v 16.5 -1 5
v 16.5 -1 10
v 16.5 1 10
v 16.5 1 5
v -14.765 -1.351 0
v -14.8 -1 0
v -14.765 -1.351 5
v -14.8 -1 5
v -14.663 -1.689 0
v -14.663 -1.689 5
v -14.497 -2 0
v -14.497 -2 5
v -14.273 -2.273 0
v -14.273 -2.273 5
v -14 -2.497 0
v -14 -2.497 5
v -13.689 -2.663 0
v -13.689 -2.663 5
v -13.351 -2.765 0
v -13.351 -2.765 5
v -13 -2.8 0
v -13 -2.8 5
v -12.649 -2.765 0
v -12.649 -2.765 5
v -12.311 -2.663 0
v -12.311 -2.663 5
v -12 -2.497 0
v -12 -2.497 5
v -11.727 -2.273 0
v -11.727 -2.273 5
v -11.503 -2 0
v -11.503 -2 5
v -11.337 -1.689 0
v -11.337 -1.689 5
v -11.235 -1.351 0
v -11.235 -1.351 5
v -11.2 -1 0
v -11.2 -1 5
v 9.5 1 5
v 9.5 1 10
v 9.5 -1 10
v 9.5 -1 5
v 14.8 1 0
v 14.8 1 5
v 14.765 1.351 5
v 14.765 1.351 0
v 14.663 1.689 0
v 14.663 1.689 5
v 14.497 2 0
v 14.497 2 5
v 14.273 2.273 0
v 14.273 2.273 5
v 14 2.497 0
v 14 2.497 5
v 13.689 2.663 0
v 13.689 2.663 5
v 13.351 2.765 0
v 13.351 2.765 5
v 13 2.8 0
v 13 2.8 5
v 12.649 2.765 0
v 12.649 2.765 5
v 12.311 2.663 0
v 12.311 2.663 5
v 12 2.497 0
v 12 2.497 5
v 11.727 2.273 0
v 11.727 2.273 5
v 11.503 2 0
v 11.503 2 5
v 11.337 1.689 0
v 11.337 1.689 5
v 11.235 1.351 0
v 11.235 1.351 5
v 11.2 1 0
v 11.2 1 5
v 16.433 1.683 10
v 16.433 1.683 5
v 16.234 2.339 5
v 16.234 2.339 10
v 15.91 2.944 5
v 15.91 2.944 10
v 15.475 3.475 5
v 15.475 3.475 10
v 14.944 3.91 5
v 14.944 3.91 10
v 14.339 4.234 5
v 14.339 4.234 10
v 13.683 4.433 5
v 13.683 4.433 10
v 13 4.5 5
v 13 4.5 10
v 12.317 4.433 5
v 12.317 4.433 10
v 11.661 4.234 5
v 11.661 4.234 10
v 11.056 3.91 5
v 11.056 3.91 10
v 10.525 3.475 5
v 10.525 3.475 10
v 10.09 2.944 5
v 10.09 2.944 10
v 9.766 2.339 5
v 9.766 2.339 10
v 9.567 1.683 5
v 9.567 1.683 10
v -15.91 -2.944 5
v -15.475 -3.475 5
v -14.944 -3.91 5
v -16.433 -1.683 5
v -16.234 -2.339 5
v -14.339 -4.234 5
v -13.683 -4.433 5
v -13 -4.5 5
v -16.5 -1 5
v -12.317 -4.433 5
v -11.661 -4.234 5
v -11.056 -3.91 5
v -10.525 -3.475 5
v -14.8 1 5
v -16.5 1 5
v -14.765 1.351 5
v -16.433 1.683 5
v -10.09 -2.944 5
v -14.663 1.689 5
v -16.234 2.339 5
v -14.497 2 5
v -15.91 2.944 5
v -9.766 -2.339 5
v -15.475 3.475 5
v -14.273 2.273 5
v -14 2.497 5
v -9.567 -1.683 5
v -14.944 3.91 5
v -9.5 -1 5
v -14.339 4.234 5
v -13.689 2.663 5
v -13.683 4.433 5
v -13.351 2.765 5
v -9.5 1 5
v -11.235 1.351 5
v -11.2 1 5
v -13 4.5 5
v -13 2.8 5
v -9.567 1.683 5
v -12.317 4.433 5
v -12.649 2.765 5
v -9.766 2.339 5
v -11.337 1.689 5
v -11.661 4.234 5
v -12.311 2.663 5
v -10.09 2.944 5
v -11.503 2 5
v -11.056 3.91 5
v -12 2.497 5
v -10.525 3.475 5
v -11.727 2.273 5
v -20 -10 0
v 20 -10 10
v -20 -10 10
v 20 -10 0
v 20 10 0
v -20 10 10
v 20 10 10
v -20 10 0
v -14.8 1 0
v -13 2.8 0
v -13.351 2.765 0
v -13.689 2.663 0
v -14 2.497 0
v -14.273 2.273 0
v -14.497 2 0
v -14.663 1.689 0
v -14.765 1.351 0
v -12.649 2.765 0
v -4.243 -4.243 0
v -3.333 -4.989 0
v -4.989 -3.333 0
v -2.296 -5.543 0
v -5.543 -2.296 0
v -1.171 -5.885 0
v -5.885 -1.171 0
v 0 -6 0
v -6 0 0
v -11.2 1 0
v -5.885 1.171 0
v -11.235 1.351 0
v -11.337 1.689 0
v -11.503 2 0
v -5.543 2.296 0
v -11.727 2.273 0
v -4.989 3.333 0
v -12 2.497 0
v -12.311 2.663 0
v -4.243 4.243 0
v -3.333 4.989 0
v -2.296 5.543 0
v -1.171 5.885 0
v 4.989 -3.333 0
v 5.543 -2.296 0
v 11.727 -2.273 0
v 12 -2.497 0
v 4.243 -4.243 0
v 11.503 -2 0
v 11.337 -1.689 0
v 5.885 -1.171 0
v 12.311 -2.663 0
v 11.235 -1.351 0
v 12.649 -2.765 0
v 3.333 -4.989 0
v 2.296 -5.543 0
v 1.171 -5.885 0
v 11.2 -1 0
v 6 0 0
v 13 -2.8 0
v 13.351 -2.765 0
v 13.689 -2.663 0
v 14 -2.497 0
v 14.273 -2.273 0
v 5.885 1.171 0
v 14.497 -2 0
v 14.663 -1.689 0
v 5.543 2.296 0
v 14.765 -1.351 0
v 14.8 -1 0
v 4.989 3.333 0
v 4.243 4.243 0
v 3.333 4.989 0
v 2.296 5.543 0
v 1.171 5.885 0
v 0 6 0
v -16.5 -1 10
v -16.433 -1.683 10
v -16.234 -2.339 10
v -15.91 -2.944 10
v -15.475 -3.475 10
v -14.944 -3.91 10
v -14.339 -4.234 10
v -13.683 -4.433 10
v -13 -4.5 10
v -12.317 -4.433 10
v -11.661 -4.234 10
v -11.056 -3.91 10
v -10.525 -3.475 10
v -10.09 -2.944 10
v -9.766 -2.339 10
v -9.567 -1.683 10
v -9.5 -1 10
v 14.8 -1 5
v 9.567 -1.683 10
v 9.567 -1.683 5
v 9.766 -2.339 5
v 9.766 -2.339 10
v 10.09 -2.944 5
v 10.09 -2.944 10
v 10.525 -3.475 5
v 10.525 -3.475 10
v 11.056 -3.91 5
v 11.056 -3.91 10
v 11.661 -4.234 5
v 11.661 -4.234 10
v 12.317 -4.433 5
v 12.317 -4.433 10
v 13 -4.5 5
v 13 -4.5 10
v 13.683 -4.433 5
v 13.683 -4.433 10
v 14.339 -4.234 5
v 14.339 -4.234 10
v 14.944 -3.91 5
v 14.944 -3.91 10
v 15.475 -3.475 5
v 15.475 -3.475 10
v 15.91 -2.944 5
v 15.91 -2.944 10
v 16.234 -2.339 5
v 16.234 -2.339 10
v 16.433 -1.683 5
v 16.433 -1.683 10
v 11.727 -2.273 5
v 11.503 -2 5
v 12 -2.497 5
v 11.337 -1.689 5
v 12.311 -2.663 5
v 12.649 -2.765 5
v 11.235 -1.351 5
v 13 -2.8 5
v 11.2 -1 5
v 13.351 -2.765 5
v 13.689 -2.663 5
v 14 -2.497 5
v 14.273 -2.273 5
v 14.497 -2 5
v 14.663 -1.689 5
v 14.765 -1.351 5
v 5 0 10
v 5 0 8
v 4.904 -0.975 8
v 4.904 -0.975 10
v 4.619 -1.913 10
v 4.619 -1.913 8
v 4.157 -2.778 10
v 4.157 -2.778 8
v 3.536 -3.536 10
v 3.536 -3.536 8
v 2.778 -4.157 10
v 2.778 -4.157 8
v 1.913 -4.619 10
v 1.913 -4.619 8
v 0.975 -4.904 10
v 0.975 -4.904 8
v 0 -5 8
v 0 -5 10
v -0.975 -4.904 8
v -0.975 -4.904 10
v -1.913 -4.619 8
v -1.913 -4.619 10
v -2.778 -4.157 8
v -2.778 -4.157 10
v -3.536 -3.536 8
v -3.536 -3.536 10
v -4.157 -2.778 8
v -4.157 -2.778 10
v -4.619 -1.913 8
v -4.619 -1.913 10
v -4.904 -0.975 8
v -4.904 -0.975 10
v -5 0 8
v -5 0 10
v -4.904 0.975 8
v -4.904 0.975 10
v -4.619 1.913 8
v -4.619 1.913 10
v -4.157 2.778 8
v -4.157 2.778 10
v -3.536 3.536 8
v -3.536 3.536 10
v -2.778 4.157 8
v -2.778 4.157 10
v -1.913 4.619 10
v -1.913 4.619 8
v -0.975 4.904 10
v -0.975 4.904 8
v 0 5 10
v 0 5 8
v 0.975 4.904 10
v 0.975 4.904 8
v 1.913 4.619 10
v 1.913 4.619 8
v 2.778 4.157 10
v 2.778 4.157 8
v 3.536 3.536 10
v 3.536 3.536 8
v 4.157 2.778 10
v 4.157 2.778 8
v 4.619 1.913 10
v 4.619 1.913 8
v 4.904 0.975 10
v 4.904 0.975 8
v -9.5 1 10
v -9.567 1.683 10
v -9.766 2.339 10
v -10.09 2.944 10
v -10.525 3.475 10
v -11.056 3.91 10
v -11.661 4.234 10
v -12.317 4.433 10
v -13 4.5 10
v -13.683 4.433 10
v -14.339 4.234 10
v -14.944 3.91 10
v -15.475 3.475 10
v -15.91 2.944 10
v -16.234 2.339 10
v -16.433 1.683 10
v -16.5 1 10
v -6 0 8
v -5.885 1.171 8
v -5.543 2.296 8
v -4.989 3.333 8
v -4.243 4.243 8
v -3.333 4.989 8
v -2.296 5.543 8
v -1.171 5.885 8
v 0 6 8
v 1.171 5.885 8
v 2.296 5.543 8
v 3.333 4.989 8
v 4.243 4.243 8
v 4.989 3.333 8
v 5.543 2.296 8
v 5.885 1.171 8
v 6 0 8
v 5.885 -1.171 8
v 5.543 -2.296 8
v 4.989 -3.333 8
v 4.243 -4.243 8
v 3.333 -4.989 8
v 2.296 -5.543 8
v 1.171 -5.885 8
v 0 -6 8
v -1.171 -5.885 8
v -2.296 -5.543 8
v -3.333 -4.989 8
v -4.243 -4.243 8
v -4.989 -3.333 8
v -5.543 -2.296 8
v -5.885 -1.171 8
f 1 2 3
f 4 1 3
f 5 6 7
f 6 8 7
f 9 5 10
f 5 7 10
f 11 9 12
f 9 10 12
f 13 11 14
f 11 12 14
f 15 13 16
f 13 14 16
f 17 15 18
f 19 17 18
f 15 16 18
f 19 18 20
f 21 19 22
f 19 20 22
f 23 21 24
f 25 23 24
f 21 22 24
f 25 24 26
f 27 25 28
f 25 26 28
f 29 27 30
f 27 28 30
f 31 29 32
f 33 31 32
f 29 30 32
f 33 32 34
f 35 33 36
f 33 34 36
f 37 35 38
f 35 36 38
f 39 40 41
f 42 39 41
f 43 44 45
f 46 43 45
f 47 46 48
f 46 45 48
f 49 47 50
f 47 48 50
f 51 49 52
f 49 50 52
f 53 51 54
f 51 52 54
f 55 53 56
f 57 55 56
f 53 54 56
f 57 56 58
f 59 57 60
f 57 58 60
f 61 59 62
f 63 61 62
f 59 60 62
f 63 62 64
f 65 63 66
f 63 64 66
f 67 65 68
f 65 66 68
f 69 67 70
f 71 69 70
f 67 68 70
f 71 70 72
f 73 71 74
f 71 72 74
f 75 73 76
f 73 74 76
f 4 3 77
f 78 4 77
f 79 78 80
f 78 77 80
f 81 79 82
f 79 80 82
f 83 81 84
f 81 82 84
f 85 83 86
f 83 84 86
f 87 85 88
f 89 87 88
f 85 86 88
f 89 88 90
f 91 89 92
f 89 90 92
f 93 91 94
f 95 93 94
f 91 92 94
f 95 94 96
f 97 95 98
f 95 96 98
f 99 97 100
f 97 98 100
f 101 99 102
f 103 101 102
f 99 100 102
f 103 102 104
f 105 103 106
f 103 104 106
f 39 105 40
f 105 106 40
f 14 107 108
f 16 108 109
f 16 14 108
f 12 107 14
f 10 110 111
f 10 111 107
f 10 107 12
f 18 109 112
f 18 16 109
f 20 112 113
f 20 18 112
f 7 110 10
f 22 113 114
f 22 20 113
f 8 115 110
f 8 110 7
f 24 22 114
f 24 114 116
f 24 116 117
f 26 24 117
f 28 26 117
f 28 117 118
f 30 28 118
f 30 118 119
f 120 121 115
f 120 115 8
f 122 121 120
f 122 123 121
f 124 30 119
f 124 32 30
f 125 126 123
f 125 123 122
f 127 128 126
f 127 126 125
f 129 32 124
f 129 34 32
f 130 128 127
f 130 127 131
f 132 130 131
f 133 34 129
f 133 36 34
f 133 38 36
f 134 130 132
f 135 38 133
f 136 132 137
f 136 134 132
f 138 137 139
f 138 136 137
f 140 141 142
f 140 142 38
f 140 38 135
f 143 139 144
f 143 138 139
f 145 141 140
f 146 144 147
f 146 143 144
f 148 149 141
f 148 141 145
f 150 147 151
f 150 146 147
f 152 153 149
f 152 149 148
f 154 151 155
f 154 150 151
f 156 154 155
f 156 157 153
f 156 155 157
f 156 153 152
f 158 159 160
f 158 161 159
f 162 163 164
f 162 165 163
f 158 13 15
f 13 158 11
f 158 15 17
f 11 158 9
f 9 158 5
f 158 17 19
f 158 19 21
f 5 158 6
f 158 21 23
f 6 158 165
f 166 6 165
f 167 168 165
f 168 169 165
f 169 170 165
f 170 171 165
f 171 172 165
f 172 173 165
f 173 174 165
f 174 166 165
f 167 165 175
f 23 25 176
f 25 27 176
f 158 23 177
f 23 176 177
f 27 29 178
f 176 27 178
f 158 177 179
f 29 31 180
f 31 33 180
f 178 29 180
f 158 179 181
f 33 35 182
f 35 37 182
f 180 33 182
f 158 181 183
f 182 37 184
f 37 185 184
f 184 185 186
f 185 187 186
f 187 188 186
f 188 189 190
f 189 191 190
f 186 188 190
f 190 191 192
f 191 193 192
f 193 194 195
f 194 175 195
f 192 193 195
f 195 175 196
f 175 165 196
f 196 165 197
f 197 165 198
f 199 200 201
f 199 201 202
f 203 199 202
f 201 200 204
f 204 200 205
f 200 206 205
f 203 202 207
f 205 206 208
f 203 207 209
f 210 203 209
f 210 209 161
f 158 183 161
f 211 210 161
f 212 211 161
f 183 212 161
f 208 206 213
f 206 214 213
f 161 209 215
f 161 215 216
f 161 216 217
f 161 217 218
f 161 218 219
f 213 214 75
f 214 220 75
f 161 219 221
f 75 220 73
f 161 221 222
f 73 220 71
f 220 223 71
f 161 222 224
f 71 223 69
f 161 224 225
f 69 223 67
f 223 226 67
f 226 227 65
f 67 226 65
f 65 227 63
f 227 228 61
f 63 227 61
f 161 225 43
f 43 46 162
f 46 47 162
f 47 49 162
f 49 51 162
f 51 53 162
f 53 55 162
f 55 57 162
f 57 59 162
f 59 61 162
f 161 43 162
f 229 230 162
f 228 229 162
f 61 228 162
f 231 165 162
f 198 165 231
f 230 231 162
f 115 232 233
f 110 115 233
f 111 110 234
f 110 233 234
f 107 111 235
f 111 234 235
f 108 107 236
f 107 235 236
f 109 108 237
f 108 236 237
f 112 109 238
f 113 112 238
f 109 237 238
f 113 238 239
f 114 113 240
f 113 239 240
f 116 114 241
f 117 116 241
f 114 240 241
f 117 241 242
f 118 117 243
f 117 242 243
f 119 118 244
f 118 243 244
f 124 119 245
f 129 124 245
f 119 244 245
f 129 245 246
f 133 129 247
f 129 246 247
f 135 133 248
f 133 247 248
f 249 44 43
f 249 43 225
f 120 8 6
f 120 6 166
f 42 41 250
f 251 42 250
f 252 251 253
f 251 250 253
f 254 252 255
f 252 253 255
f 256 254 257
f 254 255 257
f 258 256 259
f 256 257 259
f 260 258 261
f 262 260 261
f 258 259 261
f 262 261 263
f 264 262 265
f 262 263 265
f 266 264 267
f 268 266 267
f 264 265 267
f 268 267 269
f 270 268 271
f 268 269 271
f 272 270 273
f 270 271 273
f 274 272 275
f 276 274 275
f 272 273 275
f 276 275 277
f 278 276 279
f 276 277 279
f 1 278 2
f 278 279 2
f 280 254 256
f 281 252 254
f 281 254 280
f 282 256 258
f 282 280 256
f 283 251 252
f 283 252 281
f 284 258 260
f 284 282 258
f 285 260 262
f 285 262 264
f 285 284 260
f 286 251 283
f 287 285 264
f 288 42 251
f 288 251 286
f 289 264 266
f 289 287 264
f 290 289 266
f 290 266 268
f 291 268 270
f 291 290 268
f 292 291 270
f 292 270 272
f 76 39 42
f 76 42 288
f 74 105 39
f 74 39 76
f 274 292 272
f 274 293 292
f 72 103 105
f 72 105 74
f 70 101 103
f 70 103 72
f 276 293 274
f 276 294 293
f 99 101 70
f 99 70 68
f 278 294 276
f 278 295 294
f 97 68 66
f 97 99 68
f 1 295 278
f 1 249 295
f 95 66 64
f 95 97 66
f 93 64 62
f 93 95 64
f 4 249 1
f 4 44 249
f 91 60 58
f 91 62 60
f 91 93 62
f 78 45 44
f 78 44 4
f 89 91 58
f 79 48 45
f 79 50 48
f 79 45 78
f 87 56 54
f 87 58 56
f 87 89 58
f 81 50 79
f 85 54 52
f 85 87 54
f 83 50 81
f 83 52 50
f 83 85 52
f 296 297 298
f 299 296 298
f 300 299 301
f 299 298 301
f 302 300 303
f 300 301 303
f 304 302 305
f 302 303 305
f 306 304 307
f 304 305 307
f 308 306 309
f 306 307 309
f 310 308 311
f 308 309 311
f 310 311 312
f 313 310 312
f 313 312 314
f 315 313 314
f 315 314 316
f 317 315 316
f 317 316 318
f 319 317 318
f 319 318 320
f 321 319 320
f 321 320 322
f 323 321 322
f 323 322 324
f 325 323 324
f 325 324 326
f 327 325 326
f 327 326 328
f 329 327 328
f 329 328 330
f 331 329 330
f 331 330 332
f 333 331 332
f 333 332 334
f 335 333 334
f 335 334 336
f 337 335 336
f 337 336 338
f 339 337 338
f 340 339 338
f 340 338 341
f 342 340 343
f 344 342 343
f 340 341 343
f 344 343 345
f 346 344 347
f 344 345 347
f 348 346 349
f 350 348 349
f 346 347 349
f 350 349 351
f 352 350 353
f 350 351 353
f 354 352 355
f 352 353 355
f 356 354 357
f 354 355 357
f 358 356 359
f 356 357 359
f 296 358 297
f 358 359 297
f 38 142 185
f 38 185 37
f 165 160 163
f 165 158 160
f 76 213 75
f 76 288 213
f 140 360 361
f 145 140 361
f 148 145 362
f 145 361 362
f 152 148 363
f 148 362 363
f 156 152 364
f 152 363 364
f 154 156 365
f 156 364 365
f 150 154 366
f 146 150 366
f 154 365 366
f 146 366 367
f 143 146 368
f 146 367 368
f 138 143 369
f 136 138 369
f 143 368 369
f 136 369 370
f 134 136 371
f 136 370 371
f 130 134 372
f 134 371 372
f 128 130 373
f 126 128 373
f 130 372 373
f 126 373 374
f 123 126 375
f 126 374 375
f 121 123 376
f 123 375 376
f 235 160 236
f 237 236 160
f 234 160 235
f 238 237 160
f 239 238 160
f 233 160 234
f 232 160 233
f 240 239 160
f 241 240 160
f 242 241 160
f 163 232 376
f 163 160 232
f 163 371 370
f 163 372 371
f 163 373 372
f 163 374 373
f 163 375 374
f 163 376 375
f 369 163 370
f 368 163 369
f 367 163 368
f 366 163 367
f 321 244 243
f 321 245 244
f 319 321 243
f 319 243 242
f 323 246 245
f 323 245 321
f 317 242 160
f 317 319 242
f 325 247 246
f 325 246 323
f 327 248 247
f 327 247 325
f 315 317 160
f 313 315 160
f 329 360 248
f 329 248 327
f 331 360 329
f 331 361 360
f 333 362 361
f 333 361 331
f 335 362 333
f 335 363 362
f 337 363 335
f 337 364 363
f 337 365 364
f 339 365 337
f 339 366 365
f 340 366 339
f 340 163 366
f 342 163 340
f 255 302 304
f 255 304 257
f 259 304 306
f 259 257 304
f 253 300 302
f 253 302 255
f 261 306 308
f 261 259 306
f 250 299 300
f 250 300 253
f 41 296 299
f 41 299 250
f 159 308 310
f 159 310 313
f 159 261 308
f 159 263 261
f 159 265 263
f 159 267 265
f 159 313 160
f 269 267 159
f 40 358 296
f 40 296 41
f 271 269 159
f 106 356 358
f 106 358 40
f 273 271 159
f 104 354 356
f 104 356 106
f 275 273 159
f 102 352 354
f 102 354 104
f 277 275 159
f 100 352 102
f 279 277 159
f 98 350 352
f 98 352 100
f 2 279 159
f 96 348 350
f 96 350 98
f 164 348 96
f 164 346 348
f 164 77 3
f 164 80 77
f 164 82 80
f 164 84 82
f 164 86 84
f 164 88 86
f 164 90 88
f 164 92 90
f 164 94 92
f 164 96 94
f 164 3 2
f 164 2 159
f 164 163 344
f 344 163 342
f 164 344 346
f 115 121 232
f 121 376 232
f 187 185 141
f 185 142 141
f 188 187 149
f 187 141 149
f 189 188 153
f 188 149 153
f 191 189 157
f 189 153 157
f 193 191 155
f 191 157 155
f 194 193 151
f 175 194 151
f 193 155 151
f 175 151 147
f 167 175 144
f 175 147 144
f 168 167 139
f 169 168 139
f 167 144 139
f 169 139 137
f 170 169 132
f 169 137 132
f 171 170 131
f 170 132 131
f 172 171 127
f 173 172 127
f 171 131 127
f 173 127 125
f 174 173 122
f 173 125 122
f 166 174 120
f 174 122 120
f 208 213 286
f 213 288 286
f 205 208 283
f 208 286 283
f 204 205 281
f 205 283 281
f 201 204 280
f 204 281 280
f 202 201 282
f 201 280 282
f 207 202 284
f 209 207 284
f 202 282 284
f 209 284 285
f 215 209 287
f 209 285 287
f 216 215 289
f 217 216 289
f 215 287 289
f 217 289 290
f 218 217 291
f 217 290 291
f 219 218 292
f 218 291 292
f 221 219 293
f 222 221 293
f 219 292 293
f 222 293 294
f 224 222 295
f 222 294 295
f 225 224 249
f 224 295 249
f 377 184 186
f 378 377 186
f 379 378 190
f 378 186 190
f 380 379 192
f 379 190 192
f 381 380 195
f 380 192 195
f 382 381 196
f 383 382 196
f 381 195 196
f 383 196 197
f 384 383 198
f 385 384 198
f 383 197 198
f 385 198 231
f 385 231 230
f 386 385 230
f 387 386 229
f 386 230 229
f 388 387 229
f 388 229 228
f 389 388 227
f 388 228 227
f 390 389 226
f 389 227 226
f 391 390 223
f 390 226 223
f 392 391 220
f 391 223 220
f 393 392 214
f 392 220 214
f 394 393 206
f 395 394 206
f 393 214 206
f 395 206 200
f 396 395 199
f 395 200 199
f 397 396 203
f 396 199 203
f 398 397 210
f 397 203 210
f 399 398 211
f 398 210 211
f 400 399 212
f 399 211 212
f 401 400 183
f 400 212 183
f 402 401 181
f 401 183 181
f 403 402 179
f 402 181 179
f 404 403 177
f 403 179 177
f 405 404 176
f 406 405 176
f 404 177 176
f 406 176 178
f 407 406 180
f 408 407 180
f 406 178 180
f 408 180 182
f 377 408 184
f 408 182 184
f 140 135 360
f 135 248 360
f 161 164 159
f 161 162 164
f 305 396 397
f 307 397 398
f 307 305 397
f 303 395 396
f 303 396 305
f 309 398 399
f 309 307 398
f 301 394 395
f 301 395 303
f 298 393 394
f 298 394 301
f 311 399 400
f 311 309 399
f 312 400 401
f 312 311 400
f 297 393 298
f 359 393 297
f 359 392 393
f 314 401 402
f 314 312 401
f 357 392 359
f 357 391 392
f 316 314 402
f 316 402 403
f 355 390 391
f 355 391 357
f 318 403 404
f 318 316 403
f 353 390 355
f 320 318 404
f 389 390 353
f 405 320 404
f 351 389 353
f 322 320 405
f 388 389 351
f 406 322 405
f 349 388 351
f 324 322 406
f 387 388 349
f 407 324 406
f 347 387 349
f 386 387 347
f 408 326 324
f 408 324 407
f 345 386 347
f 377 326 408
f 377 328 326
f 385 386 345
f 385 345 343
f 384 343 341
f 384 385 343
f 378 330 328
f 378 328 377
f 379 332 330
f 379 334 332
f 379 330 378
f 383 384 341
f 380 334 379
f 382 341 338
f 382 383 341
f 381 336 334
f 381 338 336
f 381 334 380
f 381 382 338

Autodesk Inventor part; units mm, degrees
ref_plane "YZ Plane" through (0, 0, 0) normal (1, 0, 0) x (0, 1, 0)
ref_plane "XZ Plane" through (0, 0, 0) normal (0, 1, 0) x (-1, 0, 0)
ref_plane "XY Plane" through (0, 0, 0) normal (0, 0, 1) x (1, 0, 0)
sketch "Skizze1" plane through (0, 0, 0) normal (0, 0, 1) x (1, 0, 0)
  line L0 (-20, 10) -> (20, 10)
  line L1 (20, 10) -> (20, -10)
  line L2 (20, -10) -> (-20, -10)
  line L3 (-20, -10) -> (-20, 10)
  line L4 (-28, 0) -> (28, 0) projected
  line L5 (0, -14) -> (0, 14) projected
  circle A0 centre (0, 0) radius 5
  dimension "d0" = 40
  dimension "d1" = 20
  dimension "d2" = 10
extrude "Extrusion1" add sketch "Skizze1" along normal blind 10 contours L0 L5 A0 L4 L3 | L0 L1 L4 A0 L5 | L4 A0 L5 L2 L3 | L1 L2 L5 A0 L4
sketch "Skizze2" plane through (0, 0, 0) normal (0, 0, -1) x (-1, 0, 0)
  circle A0 centre (0, 0) radius 5 projected
  circle A1 centre (0, 0) radius 6
  dimension "d5" = 12
extrude "Extrusion2" cut sketch "Skizze2" against normal blind 8
sketch "Skizze3" plane through (0, 0, 10) normal (0, 0, 1) x (1, 0, 0)
  line L0 (-20, 10) -> (20, 10) projected
  line L1 (20, -10) -> (-20, -10) projected
  line L2 (-13, 10) -> (-13, -10)
  line L3 (13, -10) -> (13, 10)
  line L4 (-11.2, 1) -> (-11.2, -1)
  line L5 (-14.8, -1) -> (-14.8, 1)
  line L6 (14.8, 1) -> (14.8, -1)
  line L7 (11.2, -1) -> (11.2, 1)
  line L8 (-28, 0) -> (28, 0) projected
  line L9 (0, -14) -> (0, 14) projected
  arc A0 (-11.2, 1) -> (-14.8, 1) centre (-13, 1) ccw
  arc A1 (-14.8, -1) -> (-11.2, -1) centre (-13, -1) ccw
  arc A2 (11.2, -1) -> (14.8, -1) centre (13, -1) ccw
  arc A3 (14.8, 1) -> (11.2, 1) centre (13, 1) ccw
  dimension "d8" = 26
  dimension "d9" = 3.6
  dimension "d11" = 2
extrude "Extrusion3" cut sketch "Skizze3" against normal through all contours A0 L4 L8 L2 | L2 L8 L5 A0 | L8 L4 A1 L2 | L2 A1 L5 L8 | A3 L6 L8 L3 | L3 L8 L7 A3 | L8 L3 A2 L7 | L8 L6 A2 L3
sketch "Skizze4" plane through (0, 0, 10) normal (0, 0, 1) x (1, 0, 0)
  arc A0 (-14.8, -1) -> (-11.2, -1) centre (-13, -1) ccw projected
  line L0 (-14.8, -1) -> (-14.8, 1) projected
  arc A1 (-11.2, 1) -> (-14.8, 1) centre (-13, 1) ccw projected
  line L1 (-11.2, 1) -> (-11.2, -1) projected
  arc A2 (11.2, -1) -> (14.8, -1) centre (13, -1) ccw projected
  line L2 (11.2, -1) -> (11.2, 1) projected
  arc A3 (14.8, 1) -> (11.2, 1) centre (13, 1) ccw projected
  line L3 (14.8, 1) -> (14.8, -1) projected
  line L4 (-16.5, 1) -> (-16.5, -1)
  arc A4 (-16.5, -1) -> (-9.5, -1) centre (-13, -1) ccw
  line L5 (-9.5, -1) -> (-9.5, 1)
  arc A5 (-9.5, 1) -> (-16.5, 1) centre (-13, 1) ccw
  line L6 (9.5, 1) -> (9.5, -1)
  arc A6 (9.5, -1) -> (16.5, -1) centre (13, -1) ccw
  line L7 (16.5, -1) -> (16.5, 1)
  arc A7 (16.5, 1) -> (9.5, 1) centre (13, 1) ccw
  dimension "d14" = 7
extrude "Extrusion4" cut sketch "Skizze4" against normal blind 5
properties part number "13_0204_057"
